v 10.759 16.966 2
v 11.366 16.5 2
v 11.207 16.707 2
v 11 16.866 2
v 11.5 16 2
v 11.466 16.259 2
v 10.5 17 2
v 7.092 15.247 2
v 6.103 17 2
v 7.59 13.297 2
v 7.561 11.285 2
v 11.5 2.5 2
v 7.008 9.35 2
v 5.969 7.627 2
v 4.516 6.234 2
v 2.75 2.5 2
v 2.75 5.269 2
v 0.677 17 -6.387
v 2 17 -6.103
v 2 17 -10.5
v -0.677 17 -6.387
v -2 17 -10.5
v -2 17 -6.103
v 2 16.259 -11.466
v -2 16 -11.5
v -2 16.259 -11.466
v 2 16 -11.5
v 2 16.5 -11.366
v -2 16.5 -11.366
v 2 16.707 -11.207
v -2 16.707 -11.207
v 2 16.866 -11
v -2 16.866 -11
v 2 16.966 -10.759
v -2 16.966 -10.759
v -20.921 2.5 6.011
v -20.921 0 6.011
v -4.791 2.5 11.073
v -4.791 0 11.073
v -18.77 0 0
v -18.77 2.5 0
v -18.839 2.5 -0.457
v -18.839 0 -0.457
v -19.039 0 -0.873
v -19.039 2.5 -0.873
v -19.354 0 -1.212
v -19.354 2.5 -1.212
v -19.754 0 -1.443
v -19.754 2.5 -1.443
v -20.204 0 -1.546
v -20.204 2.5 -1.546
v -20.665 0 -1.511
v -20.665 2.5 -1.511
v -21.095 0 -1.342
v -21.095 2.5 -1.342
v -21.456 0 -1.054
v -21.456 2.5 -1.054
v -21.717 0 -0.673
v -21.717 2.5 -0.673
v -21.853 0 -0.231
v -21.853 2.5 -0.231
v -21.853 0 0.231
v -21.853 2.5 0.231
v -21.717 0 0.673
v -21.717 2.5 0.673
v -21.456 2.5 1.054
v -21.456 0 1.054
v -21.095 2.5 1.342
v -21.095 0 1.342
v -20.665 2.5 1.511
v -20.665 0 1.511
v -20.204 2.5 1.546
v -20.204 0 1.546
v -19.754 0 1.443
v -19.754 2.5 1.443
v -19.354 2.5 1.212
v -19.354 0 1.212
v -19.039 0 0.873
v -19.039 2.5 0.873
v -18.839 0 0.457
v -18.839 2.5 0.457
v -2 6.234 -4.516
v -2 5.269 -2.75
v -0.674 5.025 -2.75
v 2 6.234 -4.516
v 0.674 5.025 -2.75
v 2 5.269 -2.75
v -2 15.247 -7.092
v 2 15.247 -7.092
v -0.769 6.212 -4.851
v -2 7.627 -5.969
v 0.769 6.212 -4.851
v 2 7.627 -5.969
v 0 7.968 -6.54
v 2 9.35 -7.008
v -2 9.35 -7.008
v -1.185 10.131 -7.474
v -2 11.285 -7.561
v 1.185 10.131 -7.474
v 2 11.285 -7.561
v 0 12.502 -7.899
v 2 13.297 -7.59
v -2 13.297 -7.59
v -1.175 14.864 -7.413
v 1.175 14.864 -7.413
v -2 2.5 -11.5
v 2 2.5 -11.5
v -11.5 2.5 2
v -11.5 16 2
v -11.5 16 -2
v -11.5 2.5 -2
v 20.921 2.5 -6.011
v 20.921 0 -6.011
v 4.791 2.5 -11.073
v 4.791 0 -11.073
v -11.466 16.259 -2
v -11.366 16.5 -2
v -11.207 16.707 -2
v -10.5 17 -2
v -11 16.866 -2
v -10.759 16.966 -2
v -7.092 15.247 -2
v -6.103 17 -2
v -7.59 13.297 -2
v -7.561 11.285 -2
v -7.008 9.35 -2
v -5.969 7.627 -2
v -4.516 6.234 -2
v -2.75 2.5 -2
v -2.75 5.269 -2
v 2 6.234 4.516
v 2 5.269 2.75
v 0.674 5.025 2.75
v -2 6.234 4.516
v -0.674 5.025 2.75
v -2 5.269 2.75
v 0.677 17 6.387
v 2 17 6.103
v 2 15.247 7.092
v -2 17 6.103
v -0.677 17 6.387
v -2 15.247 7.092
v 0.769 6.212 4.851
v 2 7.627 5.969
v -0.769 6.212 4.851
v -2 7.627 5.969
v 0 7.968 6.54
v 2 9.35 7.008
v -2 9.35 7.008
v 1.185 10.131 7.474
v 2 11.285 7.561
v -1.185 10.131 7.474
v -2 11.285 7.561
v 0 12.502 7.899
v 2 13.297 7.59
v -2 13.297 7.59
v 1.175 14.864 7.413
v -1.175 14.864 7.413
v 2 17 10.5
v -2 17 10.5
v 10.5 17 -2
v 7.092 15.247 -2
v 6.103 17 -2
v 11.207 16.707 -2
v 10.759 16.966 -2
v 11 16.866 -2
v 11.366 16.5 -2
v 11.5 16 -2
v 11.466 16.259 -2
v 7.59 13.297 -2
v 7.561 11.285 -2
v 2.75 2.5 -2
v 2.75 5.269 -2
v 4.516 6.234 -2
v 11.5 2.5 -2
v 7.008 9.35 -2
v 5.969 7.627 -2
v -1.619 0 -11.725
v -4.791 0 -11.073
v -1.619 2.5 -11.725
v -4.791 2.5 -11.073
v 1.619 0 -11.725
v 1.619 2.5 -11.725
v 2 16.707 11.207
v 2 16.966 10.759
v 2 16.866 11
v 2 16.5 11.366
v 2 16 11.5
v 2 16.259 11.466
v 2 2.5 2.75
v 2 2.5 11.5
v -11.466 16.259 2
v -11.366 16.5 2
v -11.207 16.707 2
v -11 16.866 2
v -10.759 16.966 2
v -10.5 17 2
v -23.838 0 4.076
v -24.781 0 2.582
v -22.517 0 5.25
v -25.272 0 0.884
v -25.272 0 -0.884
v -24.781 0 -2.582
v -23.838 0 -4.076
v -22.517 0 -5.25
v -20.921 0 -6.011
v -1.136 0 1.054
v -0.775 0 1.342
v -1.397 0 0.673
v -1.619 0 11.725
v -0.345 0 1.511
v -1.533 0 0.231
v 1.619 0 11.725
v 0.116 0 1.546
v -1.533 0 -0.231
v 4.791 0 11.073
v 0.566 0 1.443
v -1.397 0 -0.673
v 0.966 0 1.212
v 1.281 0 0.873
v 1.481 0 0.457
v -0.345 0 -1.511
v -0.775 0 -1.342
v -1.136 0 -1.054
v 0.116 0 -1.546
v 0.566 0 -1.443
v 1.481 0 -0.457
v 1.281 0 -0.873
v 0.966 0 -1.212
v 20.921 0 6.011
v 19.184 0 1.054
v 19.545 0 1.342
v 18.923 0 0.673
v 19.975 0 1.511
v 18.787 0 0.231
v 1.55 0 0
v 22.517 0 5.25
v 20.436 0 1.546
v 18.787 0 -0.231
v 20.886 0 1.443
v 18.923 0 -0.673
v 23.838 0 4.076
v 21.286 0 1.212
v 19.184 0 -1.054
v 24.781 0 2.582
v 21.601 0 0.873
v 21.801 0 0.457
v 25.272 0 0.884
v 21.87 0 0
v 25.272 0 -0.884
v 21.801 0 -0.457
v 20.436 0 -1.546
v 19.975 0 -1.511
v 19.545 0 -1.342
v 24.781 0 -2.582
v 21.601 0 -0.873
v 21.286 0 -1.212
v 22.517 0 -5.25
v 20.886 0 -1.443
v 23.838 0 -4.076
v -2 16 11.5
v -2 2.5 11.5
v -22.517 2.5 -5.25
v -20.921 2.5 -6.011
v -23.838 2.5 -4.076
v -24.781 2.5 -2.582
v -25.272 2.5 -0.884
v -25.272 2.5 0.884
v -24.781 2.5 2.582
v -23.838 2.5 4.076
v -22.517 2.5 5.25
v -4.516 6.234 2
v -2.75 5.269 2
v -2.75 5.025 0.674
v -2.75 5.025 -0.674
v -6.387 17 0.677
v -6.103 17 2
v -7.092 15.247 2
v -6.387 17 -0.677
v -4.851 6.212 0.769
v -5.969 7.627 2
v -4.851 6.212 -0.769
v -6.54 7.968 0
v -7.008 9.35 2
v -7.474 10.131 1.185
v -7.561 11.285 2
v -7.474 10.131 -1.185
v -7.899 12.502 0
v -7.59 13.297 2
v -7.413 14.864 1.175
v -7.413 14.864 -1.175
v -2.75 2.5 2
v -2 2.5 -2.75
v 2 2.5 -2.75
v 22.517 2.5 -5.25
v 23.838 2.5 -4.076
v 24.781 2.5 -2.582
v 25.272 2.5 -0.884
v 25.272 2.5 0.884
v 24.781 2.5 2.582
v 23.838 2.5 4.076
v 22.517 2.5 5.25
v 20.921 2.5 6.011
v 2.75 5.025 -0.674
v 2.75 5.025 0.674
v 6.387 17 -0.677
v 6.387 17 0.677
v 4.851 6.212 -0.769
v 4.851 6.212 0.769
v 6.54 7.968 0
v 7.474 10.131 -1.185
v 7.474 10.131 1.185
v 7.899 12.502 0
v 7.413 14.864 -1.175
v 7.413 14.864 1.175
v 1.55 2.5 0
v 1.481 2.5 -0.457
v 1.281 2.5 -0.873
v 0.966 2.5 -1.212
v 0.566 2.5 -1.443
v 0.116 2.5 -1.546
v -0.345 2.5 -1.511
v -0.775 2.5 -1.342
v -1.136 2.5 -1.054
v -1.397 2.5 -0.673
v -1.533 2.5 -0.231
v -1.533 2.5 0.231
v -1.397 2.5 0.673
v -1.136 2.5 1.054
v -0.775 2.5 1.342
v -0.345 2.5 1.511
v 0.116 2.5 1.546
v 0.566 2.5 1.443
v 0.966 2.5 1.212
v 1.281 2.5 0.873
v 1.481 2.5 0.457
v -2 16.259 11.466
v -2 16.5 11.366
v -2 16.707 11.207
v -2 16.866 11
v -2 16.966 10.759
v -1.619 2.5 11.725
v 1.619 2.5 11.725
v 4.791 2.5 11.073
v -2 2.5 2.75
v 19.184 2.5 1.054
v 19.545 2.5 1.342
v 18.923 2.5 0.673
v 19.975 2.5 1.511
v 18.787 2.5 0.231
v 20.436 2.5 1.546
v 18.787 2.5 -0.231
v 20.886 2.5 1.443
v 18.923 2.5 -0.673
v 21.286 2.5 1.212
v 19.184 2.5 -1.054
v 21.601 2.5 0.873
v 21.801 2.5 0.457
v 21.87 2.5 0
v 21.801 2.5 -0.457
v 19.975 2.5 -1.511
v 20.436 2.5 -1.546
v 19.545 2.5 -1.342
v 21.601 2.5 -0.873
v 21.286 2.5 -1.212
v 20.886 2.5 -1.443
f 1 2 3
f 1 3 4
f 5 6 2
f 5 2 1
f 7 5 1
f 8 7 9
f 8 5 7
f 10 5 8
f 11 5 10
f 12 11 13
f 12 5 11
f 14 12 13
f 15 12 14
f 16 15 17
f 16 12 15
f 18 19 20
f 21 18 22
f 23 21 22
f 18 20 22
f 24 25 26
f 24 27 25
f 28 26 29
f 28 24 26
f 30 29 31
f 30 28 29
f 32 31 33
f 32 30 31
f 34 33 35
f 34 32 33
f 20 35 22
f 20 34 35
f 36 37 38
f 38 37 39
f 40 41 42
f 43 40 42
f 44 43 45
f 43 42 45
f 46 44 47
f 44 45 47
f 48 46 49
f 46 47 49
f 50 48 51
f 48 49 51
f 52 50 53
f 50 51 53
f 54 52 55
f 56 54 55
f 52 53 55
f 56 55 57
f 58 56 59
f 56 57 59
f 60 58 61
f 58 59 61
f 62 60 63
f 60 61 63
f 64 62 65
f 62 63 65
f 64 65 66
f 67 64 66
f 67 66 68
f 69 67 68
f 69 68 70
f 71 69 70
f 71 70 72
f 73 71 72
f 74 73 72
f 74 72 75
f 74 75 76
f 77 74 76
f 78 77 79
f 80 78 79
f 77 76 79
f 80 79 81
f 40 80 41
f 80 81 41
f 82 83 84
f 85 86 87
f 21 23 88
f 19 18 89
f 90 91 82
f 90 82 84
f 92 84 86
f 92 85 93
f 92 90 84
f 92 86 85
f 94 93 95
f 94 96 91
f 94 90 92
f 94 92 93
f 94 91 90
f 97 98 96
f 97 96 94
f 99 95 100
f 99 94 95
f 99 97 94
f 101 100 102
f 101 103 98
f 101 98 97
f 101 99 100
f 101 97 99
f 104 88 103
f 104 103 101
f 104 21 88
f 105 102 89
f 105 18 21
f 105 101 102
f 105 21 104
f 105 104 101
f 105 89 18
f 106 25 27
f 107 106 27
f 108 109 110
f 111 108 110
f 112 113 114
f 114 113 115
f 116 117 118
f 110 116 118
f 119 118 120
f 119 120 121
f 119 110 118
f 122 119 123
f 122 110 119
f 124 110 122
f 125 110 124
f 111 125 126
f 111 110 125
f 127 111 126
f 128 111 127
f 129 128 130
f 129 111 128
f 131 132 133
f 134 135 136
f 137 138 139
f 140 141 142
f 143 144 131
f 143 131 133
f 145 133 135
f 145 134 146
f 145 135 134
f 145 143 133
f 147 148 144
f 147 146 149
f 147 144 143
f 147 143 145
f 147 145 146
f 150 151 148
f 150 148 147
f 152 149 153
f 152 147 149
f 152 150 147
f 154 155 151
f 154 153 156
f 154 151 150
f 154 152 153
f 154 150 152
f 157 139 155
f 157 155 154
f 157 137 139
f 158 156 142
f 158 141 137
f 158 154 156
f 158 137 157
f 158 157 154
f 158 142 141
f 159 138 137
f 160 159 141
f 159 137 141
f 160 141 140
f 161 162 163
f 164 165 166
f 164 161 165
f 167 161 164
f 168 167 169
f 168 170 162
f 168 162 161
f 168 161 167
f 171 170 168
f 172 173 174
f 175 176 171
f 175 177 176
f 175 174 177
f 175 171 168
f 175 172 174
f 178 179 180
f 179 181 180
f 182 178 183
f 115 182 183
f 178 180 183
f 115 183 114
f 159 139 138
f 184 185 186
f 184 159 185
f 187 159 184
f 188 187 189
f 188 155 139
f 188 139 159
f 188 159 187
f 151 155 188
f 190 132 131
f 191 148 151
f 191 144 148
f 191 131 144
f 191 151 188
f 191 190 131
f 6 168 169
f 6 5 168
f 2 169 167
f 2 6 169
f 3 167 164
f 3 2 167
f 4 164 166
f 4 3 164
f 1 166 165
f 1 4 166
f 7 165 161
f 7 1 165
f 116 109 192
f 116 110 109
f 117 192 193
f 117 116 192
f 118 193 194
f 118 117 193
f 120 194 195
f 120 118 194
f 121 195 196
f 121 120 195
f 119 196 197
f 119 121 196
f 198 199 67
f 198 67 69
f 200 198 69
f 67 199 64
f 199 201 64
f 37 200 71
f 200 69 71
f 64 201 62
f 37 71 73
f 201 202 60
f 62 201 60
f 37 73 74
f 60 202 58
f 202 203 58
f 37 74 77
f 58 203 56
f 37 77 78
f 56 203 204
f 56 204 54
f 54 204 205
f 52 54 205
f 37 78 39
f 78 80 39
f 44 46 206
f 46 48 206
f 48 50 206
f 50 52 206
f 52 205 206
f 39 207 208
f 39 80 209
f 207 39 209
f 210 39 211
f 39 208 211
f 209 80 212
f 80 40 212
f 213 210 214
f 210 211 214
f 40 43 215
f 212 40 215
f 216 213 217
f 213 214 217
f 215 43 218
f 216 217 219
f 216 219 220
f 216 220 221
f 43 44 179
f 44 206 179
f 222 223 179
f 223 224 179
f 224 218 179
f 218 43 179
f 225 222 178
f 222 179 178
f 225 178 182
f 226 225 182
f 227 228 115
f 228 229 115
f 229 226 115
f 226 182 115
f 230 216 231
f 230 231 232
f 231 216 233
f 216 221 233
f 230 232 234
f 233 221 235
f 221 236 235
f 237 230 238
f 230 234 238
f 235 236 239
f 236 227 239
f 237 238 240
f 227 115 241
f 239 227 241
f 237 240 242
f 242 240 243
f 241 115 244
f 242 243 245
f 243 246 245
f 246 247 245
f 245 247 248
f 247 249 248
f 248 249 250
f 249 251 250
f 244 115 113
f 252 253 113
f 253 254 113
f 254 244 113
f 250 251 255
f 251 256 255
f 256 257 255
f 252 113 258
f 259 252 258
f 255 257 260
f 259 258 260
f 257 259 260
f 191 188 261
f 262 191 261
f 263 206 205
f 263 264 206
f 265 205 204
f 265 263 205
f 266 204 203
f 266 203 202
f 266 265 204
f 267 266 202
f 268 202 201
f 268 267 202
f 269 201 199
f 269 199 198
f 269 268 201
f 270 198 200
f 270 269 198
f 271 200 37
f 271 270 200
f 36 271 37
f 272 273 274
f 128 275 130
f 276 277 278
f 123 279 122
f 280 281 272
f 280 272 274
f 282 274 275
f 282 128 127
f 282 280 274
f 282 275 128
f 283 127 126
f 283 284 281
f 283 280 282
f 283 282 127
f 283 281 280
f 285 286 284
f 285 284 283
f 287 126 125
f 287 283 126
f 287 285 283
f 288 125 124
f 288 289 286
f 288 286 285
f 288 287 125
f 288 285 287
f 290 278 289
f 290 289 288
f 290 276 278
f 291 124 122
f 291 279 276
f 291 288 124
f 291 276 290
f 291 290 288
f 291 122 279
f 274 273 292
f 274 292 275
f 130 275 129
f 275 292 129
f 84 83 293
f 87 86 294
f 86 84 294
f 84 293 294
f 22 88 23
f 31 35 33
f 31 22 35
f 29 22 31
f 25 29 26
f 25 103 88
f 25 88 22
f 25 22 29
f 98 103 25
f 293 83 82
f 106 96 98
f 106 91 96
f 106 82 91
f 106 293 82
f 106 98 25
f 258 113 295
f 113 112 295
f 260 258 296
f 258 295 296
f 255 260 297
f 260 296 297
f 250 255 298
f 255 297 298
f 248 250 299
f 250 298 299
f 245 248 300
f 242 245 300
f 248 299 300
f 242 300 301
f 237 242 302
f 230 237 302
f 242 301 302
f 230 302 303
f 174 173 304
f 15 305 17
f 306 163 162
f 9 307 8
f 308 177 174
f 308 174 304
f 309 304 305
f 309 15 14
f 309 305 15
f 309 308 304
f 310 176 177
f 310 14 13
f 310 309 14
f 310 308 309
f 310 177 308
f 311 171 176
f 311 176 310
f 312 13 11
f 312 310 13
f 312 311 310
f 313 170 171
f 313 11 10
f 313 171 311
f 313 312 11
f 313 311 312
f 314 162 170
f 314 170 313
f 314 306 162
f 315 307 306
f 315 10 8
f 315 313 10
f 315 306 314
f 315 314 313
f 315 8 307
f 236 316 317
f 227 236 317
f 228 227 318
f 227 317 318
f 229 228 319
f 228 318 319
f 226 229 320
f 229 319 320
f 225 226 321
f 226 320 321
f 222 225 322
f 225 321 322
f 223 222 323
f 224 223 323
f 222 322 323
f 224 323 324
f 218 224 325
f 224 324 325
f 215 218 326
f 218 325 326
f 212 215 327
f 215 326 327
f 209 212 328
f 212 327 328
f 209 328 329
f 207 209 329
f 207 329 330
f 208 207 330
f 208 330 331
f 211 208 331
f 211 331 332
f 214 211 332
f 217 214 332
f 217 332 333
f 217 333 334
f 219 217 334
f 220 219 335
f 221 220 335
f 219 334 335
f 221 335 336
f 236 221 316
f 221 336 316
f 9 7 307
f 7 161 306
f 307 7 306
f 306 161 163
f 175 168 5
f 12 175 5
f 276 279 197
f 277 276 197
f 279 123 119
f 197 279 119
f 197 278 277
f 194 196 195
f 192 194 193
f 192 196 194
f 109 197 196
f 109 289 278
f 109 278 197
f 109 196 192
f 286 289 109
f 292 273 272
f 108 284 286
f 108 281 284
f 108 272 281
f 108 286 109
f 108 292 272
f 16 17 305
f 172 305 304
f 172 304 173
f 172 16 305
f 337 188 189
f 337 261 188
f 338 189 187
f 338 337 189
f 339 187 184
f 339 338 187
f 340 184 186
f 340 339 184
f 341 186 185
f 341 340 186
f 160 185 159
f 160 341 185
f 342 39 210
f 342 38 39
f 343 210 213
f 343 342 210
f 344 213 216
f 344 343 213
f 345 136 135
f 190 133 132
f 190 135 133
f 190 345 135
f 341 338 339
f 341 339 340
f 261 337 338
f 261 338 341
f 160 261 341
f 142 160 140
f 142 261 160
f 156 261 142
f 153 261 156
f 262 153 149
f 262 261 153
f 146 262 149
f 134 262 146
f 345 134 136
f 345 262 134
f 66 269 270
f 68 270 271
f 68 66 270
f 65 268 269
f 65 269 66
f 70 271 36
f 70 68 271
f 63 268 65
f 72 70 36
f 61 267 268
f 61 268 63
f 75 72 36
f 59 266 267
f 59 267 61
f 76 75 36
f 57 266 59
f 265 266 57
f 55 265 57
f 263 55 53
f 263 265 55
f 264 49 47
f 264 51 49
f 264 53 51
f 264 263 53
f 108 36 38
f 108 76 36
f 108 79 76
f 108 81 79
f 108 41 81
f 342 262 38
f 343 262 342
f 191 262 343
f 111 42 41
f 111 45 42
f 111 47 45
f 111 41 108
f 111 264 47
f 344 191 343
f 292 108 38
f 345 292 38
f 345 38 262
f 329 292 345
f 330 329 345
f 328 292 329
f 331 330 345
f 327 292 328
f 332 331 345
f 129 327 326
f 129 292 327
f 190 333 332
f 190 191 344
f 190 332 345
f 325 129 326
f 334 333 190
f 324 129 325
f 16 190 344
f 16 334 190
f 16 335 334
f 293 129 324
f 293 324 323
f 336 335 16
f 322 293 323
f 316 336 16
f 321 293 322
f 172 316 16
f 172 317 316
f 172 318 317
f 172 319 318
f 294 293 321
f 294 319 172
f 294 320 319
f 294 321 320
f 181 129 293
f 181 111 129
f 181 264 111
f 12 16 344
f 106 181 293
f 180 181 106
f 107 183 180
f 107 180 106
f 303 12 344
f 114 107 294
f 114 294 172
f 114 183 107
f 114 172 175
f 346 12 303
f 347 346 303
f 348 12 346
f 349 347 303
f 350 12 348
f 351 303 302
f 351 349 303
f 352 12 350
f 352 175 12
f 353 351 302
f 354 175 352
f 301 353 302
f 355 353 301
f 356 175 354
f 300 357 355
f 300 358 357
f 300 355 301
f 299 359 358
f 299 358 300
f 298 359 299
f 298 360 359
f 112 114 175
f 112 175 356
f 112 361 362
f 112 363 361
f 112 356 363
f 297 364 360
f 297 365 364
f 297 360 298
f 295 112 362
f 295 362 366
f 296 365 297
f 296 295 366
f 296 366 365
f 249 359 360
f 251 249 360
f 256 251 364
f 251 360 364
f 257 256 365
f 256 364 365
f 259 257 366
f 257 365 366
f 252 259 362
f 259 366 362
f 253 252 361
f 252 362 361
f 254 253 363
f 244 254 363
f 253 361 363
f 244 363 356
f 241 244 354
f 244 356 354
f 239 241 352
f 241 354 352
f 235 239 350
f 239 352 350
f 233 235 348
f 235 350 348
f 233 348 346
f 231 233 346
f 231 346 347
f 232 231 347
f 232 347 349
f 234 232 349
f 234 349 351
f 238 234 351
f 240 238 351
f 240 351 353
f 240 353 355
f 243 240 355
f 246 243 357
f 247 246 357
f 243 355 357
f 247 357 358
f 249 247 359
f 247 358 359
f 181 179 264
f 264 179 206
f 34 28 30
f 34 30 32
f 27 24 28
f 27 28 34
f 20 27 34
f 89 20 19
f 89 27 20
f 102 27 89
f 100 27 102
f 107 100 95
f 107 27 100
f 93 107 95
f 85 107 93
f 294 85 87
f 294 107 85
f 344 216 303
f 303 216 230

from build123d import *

# Parameters (mm, degrees)
BOSS_EXTRUDE1_DEPTH = 2.5
FILLET1_R           = 16
FILLET2_R           = 6.3
BOSS_EXTRUDE2_DEPTH = 14.5
FILLET3_R           = 1
SKETCH5_W           = 5.5
SKETCH5_H           = 5.5
CUT_EXTRUDE1_DEPTH  = 31.959805
SKETCH6_R           = 1.55
CUT_EXTRUDE2_DEPTH  = 2.5
SKETCH7_R           = 1.55
CUT_EXTRUDE3_DEPTH  = 2.5


with BuildPart() as part:
    # Sketch1 → Boss-Extrude1 (new body)
    with BuildSketch(Plane(origin=(0, 0, 0), x_dir=(1, 0, 0), z_dir=(0, 1, 0))):
        Polygon((0, 12.577166077), (-40.072620247, 0), (0, -12.577166077), (40.072620247, 0), align=None)
    extrude(amount=BOSS_EXTRUDE1_DEPTH)

    # Fillet1
    fillet1_edges = [part.edges().sort_by_distance(p)[0] for p in [
        (0, 1.25, 12.577166077),
        (0, 1.25, -12.577166077),
    ]]
    fillet(fillet1_edges, radius=FILLET1_R)

    # Fillet2
    fillet2_edges = [part.edges().sort_by_distance(p)[0] for p in [
        (40.072620247, 1.25, 0),
        (-40.072620247, 1.25, 0),
    ]]
    fillet(fillet2_edges, radius=FILLET2_R)

    # Sketch2 → Boss-Extrude2 (add)
    with BuildSketch(Plane(origin=(0, 2.5, 0), x_dir=(1, 0, 0), z_dir=(0, 1, 0))):
        Polygon((2, 2), (11.5, 2), (11.5, -2), (2, -2), (2, -11.5), (-2, -11.5), (-2, -2), (-11.5, -2), (-11.5, 2), (-2, 2), (-2, 11.5), (2, 11.5), align=None)
    extrude(amount=BOSS_EXTRUDE2_DEPTH)

    # Sketch3 → Cut-Revolve1 (revolve, cut)
    with BuildSketch(Plane.XY):
        with BuildLine():
            ThreePointArc((0, 4.5), (7.9, 12.4), (0, 20.3))
            Line((0, 20.3), (0, 4.5))
        make_face()
    revolve(axis=Axis((0, 20.3, 0), (0, -1, 0)), mode=Mode.SUBTRACT)

    # Fillet3
    fillet3_edges = [part.edges().sort_by_distance(p)[0] for p in [
        (-11.5, 17, 0),
        (0, 17, 11.5),
        (11.5, 17, 0),
        (0, 17, -11.5),
    ]]
    fillet(fillet3_edges, radius=FILLET3_R)

    # Sketch5 → Cut-Extrude1 (cut)
    with BuildSketch(Plane(origin=(0, 2.5, 0), x_dir=(1, 0, 0), z_dir=(0, 1, 0))):
        Rectangle(SKETCH5_W, SKETCH5_H)
    extrude(amount=CUT_EXTRUDE1_DEPTH, mode=Mode.SUBTRACT)

    # Sketch6 → Cut-Extrude2 (cut)
    with BuildSketch(Plane(origin=(0, 2.5, 0), x_dir=(1, 0, 0), z_dir=(0, 1, 0))):
        Circle(SKETCH6_R)
    extrude(amount=-CUT_EXTRUDE2_DEPTH, mode=Mode.SUBTRACT)

    # Sketch7 → Cut-Extrude3 (cut)
    with BuildSketch(Plane(origin=(0, 2.5, 0), x_dir=(1, 0, 0), z_dir=(0, 1, 0))):
        with Locations((20.32, 0)):
            Circle(SKETCH7_R)
        with Locations((-20.32, 0)):
            Circle(SKETCH7_R)
    extrude(amount=-CUT_EXTRUDE3_DEPTH, mode=Mode.SUBTRACT)


solid = part.part
